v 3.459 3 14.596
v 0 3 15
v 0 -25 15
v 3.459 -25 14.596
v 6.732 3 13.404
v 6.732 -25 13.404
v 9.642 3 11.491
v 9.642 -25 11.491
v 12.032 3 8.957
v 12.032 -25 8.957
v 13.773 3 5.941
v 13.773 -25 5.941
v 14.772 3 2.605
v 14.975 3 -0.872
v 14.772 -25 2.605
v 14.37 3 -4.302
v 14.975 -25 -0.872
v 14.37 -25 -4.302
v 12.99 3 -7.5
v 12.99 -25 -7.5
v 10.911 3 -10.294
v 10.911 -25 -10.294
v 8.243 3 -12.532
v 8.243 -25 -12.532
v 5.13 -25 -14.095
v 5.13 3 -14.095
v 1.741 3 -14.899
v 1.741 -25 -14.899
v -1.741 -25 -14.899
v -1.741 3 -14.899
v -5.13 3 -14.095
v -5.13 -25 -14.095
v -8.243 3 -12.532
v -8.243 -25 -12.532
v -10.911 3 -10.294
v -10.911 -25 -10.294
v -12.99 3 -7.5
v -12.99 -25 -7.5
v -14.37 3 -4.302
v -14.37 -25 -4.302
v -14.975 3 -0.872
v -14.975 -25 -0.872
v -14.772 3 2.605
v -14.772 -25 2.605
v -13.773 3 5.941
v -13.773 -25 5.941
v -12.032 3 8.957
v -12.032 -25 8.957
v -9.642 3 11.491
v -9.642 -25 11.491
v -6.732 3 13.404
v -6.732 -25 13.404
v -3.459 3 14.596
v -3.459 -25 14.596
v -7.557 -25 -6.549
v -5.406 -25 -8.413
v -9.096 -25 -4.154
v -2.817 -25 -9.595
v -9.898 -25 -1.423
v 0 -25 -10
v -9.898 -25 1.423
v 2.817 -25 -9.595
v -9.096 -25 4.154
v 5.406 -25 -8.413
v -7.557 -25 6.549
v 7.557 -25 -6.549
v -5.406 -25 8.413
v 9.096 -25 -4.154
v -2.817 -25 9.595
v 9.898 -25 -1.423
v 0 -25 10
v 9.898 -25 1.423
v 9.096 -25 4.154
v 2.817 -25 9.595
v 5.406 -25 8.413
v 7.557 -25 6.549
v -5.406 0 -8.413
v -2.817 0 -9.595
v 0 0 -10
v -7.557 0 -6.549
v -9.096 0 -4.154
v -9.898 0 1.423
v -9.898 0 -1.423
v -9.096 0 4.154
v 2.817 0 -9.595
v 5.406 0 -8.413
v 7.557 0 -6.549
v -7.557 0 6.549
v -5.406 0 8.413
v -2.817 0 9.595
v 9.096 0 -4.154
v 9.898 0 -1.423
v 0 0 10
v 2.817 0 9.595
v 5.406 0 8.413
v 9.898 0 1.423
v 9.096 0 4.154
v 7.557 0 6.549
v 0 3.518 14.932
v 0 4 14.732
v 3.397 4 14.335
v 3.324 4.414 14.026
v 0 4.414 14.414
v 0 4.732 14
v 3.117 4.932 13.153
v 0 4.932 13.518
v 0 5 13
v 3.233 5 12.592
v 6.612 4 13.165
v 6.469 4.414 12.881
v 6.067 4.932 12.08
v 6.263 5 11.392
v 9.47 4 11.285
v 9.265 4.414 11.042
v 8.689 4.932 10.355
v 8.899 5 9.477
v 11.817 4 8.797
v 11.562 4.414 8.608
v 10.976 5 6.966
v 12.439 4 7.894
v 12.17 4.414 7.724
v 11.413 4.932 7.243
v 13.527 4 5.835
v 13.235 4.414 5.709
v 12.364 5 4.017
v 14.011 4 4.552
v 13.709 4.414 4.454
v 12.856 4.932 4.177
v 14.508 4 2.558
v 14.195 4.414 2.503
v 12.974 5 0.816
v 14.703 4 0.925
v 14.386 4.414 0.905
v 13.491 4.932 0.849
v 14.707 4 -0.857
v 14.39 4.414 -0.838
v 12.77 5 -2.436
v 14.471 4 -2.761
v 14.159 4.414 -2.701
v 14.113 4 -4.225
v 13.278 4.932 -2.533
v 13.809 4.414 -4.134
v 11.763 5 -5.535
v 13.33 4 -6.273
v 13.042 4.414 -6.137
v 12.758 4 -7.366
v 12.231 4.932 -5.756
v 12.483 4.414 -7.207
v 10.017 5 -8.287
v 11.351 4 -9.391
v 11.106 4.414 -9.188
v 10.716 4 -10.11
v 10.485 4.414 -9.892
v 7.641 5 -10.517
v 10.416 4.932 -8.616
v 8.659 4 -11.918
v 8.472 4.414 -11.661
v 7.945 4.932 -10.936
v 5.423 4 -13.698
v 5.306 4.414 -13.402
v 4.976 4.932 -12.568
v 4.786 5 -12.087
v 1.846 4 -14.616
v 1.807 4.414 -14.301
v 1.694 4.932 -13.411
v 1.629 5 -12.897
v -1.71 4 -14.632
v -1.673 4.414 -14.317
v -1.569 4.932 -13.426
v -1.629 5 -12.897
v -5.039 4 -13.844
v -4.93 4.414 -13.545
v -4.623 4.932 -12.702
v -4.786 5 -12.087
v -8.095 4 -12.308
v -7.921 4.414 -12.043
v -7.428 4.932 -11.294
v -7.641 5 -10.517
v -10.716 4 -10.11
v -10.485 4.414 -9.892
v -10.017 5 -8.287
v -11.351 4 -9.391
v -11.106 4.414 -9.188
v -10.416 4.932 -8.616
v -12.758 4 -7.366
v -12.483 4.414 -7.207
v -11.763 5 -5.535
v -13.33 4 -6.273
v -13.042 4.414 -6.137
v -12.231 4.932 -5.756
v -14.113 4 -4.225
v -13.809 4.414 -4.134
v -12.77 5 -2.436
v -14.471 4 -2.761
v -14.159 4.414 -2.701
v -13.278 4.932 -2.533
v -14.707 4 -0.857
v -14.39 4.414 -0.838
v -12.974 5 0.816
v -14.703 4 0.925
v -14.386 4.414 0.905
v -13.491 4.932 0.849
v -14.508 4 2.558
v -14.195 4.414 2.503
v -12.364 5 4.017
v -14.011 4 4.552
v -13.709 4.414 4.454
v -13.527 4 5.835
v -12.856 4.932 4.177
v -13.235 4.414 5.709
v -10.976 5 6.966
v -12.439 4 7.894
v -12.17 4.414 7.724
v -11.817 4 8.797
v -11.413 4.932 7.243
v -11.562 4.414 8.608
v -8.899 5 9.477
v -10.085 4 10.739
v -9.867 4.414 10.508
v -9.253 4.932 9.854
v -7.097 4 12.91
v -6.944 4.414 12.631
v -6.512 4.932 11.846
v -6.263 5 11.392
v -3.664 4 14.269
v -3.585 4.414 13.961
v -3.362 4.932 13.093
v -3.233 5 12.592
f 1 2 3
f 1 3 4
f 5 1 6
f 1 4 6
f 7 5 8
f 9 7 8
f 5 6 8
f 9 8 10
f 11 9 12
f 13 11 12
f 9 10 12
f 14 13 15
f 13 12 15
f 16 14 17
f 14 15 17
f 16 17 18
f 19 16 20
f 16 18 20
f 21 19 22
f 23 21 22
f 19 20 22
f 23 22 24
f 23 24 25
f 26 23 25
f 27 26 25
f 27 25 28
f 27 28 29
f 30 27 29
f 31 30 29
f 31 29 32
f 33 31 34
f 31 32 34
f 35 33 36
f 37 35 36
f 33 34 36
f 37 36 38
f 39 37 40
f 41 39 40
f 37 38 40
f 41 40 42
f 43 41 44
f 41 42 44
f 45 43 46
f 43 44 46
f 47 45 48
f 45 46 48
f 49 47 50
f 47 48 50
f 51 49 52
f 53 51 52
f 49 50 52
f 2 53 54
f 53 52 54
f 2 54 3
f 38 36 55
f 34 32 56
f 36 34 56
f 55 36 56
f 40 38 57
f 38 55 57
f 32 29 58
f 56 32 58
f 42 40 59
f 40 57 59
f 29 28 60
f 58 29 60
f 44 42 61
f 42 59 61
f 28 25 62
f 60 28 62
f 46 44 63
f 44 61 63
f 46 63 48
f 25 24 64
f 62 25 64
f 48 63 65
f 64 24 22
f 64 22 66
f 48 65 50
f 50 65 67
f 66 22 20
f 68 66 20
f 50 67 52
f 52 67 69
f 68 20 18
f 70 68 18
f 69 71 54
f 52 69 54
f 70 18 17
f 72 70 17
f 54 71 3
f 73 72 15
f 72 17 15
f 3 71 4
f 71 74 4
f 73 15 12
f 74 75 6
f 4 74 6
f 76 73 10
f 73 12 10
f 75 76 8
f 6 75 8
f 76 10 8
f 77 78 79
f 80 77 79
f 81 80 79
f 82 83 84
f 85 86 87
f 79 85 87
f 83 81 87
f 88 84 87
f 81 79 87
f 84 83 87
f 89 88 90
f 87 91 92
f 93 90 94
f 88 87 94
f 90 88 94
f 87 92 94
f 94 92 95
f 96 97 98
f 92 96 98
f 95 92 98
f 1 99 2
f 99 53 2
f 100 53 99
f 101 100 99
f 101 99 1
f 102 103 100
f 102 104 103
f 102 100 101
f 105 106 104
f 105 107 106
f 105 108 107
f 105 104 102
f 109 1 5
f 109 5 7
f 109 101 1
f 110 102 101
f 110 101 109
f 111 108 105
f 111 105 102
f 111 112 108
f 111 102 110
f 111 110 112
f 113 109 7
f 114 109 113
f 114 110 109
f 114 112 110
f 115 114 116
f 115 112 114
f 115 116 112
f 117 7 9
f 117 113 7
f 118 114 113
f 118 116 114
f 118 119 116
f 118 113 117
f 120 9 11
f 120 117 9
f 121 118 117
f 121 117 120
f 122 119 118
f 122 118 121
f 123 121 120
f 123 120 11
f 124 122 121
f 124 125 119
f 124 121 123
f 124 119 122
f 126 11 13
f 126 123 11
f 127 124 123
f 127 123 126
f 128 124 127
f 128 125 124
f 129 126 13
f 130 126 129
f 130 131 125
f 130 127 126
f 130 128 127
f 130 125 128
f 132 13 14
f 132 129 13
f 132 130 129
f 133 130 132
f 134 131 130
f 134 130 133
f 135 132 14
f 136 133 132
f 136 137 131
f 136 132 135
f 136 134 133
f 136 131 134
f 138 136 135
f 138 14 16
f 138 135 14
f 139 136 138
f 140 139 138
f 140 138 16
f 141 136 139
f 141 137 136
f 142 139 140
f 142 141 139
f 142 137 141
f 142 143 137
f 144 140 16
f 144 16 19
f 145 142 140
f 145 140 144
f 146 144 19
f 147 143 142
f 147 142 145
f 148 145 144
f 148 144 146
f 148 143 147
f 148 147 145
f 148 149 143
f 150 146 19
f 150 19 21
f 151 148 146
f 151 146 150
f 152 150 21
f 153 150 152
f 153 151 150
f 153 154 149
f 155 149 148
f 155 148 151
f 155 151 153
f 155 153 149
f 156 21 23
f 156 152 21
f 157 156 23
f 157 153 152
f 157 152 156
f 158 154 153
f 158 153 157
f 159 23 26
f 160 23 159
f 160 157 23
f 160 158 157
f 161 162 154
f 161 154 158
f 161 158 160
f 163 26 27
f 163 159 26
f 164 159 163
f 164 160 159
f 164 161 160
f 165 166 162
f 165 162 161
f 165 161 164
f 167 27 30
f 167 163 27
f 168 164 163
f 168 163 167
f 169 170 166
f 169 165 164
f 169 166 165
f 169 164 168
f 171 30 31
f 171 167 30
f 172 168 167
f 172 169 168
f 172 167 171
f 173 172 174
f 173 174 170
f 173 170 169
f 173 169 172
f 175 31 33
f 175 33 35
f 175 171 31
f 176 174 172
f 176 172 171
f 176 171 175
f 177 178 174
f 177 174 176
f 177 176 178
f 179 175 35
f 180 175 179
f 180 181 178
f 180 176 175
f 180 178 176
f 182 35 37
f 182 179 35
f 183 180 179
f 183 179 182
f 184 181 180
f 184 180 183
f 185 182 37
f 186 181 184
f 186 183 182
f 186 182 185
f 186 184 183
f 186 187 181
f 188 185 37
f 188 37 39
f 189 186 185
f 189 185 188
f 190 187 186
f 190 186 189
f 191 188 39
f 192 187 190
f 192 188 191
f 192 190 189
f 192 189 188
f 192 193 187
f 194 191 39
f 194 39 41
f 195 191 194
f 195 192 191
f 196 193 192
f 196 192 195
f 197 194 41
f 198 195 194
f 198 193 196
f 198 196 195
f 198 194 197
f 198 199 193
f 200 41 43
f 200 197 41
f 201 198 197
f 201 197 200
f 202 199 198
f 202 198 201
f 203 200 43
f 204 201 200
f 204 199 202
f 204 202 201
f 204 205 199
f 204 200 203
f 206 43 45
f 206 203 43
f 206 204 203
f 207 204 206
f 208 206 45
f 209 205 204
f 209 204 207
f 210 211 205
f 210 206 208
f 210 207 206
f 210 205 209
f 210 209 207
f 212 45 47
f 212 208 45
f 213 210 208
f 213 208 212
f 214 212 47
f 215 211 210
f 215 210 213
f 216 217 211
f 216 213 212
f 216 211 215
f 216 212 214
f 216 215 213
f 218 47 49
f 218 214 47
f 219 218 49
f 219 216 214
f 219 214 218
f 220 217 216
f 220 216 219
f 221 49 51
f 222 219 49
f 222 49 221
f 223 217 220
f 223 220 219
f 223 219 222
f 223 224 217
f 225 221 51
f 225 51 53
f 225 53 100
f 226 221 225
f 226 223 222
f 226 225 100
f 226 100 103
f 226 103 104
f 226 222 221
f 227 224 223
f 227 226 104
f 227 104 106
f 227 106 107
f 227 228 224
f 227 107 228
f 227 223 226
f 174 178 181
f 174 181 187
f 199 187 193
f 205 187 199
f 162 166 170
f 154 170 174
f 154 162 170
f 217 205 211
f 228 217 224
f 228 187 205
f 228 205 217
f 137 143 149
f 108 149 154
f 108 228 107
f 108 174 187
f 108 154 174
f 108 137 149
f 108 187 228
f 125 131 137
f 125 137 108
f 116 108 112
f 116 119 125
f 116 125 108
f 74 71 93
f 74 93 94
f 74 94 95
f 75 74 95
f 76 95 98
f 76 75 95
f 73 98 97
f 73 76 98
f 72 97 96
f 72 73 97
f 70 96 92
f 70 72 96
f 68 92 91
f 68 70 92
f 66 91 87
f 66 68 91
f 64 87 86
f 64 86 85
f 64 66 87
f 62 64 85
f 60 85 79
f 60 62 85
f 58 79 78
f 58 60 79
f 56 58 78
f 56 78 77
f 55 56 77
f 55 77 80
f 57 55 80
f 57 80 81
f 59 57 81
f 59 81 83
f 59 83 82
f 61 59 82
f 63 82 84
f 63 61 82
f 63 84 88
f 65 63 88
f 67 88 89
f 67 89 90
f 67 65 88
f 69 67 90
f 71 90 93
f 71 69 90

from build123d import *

# Parameters (mm, degrees)
SKETCH_1_R      = 15
EXTRUDE_1_DEPTH = 5
EXTRUDE_START   = -25
SKETCH_3_R      = 15
SKETCH_3_R_2    = 10
EXTRUDE_2_DEPTH = 25
FILLET_1_R      = 2


with BuildPart() as part:
    # 草图1 → 凸台-拉伸1 (new body)
    with BuildSketch(Plane(origin=(0, 0, 0), x_dir=(1, 0, 0), z_dir=(0, 1, 0))):
        with Locations(Location((0, 0, 0), (0, 0, 270))):
            Circle(SKETCH_1_R)
    extrude(amount=EXTRUDE_1_DEPTH)

    # 草图3 → 凸台-拉伸2 (add)
    with BuildSketch(Plane(origin=(0, 0, 0), x_dir=(1, 0, 0), z_dir=(0, 1, 0)).offset(EXTRUDE_START)):
        with Locations(Location((0, 0, 0), (0, 0, 270))):
            Circle(SKETCH_3_R)
        with Locations(Location((0, 0, 0), (0, 0, 270))):
            Circle(SKETCH_3_R_2, mode=Mode.SUBTRACT)
    extrude(amount=EXTRUDE_2_DEPTH)

    # 圆角1
    fillet_1_edges = [part.edges().sort_by_distance(p)[0] for p in [
        (0, 5, -15),
    ]]
    fillet(fillet_1_edges, radius=FILLET_1_R)


solid = part.part
